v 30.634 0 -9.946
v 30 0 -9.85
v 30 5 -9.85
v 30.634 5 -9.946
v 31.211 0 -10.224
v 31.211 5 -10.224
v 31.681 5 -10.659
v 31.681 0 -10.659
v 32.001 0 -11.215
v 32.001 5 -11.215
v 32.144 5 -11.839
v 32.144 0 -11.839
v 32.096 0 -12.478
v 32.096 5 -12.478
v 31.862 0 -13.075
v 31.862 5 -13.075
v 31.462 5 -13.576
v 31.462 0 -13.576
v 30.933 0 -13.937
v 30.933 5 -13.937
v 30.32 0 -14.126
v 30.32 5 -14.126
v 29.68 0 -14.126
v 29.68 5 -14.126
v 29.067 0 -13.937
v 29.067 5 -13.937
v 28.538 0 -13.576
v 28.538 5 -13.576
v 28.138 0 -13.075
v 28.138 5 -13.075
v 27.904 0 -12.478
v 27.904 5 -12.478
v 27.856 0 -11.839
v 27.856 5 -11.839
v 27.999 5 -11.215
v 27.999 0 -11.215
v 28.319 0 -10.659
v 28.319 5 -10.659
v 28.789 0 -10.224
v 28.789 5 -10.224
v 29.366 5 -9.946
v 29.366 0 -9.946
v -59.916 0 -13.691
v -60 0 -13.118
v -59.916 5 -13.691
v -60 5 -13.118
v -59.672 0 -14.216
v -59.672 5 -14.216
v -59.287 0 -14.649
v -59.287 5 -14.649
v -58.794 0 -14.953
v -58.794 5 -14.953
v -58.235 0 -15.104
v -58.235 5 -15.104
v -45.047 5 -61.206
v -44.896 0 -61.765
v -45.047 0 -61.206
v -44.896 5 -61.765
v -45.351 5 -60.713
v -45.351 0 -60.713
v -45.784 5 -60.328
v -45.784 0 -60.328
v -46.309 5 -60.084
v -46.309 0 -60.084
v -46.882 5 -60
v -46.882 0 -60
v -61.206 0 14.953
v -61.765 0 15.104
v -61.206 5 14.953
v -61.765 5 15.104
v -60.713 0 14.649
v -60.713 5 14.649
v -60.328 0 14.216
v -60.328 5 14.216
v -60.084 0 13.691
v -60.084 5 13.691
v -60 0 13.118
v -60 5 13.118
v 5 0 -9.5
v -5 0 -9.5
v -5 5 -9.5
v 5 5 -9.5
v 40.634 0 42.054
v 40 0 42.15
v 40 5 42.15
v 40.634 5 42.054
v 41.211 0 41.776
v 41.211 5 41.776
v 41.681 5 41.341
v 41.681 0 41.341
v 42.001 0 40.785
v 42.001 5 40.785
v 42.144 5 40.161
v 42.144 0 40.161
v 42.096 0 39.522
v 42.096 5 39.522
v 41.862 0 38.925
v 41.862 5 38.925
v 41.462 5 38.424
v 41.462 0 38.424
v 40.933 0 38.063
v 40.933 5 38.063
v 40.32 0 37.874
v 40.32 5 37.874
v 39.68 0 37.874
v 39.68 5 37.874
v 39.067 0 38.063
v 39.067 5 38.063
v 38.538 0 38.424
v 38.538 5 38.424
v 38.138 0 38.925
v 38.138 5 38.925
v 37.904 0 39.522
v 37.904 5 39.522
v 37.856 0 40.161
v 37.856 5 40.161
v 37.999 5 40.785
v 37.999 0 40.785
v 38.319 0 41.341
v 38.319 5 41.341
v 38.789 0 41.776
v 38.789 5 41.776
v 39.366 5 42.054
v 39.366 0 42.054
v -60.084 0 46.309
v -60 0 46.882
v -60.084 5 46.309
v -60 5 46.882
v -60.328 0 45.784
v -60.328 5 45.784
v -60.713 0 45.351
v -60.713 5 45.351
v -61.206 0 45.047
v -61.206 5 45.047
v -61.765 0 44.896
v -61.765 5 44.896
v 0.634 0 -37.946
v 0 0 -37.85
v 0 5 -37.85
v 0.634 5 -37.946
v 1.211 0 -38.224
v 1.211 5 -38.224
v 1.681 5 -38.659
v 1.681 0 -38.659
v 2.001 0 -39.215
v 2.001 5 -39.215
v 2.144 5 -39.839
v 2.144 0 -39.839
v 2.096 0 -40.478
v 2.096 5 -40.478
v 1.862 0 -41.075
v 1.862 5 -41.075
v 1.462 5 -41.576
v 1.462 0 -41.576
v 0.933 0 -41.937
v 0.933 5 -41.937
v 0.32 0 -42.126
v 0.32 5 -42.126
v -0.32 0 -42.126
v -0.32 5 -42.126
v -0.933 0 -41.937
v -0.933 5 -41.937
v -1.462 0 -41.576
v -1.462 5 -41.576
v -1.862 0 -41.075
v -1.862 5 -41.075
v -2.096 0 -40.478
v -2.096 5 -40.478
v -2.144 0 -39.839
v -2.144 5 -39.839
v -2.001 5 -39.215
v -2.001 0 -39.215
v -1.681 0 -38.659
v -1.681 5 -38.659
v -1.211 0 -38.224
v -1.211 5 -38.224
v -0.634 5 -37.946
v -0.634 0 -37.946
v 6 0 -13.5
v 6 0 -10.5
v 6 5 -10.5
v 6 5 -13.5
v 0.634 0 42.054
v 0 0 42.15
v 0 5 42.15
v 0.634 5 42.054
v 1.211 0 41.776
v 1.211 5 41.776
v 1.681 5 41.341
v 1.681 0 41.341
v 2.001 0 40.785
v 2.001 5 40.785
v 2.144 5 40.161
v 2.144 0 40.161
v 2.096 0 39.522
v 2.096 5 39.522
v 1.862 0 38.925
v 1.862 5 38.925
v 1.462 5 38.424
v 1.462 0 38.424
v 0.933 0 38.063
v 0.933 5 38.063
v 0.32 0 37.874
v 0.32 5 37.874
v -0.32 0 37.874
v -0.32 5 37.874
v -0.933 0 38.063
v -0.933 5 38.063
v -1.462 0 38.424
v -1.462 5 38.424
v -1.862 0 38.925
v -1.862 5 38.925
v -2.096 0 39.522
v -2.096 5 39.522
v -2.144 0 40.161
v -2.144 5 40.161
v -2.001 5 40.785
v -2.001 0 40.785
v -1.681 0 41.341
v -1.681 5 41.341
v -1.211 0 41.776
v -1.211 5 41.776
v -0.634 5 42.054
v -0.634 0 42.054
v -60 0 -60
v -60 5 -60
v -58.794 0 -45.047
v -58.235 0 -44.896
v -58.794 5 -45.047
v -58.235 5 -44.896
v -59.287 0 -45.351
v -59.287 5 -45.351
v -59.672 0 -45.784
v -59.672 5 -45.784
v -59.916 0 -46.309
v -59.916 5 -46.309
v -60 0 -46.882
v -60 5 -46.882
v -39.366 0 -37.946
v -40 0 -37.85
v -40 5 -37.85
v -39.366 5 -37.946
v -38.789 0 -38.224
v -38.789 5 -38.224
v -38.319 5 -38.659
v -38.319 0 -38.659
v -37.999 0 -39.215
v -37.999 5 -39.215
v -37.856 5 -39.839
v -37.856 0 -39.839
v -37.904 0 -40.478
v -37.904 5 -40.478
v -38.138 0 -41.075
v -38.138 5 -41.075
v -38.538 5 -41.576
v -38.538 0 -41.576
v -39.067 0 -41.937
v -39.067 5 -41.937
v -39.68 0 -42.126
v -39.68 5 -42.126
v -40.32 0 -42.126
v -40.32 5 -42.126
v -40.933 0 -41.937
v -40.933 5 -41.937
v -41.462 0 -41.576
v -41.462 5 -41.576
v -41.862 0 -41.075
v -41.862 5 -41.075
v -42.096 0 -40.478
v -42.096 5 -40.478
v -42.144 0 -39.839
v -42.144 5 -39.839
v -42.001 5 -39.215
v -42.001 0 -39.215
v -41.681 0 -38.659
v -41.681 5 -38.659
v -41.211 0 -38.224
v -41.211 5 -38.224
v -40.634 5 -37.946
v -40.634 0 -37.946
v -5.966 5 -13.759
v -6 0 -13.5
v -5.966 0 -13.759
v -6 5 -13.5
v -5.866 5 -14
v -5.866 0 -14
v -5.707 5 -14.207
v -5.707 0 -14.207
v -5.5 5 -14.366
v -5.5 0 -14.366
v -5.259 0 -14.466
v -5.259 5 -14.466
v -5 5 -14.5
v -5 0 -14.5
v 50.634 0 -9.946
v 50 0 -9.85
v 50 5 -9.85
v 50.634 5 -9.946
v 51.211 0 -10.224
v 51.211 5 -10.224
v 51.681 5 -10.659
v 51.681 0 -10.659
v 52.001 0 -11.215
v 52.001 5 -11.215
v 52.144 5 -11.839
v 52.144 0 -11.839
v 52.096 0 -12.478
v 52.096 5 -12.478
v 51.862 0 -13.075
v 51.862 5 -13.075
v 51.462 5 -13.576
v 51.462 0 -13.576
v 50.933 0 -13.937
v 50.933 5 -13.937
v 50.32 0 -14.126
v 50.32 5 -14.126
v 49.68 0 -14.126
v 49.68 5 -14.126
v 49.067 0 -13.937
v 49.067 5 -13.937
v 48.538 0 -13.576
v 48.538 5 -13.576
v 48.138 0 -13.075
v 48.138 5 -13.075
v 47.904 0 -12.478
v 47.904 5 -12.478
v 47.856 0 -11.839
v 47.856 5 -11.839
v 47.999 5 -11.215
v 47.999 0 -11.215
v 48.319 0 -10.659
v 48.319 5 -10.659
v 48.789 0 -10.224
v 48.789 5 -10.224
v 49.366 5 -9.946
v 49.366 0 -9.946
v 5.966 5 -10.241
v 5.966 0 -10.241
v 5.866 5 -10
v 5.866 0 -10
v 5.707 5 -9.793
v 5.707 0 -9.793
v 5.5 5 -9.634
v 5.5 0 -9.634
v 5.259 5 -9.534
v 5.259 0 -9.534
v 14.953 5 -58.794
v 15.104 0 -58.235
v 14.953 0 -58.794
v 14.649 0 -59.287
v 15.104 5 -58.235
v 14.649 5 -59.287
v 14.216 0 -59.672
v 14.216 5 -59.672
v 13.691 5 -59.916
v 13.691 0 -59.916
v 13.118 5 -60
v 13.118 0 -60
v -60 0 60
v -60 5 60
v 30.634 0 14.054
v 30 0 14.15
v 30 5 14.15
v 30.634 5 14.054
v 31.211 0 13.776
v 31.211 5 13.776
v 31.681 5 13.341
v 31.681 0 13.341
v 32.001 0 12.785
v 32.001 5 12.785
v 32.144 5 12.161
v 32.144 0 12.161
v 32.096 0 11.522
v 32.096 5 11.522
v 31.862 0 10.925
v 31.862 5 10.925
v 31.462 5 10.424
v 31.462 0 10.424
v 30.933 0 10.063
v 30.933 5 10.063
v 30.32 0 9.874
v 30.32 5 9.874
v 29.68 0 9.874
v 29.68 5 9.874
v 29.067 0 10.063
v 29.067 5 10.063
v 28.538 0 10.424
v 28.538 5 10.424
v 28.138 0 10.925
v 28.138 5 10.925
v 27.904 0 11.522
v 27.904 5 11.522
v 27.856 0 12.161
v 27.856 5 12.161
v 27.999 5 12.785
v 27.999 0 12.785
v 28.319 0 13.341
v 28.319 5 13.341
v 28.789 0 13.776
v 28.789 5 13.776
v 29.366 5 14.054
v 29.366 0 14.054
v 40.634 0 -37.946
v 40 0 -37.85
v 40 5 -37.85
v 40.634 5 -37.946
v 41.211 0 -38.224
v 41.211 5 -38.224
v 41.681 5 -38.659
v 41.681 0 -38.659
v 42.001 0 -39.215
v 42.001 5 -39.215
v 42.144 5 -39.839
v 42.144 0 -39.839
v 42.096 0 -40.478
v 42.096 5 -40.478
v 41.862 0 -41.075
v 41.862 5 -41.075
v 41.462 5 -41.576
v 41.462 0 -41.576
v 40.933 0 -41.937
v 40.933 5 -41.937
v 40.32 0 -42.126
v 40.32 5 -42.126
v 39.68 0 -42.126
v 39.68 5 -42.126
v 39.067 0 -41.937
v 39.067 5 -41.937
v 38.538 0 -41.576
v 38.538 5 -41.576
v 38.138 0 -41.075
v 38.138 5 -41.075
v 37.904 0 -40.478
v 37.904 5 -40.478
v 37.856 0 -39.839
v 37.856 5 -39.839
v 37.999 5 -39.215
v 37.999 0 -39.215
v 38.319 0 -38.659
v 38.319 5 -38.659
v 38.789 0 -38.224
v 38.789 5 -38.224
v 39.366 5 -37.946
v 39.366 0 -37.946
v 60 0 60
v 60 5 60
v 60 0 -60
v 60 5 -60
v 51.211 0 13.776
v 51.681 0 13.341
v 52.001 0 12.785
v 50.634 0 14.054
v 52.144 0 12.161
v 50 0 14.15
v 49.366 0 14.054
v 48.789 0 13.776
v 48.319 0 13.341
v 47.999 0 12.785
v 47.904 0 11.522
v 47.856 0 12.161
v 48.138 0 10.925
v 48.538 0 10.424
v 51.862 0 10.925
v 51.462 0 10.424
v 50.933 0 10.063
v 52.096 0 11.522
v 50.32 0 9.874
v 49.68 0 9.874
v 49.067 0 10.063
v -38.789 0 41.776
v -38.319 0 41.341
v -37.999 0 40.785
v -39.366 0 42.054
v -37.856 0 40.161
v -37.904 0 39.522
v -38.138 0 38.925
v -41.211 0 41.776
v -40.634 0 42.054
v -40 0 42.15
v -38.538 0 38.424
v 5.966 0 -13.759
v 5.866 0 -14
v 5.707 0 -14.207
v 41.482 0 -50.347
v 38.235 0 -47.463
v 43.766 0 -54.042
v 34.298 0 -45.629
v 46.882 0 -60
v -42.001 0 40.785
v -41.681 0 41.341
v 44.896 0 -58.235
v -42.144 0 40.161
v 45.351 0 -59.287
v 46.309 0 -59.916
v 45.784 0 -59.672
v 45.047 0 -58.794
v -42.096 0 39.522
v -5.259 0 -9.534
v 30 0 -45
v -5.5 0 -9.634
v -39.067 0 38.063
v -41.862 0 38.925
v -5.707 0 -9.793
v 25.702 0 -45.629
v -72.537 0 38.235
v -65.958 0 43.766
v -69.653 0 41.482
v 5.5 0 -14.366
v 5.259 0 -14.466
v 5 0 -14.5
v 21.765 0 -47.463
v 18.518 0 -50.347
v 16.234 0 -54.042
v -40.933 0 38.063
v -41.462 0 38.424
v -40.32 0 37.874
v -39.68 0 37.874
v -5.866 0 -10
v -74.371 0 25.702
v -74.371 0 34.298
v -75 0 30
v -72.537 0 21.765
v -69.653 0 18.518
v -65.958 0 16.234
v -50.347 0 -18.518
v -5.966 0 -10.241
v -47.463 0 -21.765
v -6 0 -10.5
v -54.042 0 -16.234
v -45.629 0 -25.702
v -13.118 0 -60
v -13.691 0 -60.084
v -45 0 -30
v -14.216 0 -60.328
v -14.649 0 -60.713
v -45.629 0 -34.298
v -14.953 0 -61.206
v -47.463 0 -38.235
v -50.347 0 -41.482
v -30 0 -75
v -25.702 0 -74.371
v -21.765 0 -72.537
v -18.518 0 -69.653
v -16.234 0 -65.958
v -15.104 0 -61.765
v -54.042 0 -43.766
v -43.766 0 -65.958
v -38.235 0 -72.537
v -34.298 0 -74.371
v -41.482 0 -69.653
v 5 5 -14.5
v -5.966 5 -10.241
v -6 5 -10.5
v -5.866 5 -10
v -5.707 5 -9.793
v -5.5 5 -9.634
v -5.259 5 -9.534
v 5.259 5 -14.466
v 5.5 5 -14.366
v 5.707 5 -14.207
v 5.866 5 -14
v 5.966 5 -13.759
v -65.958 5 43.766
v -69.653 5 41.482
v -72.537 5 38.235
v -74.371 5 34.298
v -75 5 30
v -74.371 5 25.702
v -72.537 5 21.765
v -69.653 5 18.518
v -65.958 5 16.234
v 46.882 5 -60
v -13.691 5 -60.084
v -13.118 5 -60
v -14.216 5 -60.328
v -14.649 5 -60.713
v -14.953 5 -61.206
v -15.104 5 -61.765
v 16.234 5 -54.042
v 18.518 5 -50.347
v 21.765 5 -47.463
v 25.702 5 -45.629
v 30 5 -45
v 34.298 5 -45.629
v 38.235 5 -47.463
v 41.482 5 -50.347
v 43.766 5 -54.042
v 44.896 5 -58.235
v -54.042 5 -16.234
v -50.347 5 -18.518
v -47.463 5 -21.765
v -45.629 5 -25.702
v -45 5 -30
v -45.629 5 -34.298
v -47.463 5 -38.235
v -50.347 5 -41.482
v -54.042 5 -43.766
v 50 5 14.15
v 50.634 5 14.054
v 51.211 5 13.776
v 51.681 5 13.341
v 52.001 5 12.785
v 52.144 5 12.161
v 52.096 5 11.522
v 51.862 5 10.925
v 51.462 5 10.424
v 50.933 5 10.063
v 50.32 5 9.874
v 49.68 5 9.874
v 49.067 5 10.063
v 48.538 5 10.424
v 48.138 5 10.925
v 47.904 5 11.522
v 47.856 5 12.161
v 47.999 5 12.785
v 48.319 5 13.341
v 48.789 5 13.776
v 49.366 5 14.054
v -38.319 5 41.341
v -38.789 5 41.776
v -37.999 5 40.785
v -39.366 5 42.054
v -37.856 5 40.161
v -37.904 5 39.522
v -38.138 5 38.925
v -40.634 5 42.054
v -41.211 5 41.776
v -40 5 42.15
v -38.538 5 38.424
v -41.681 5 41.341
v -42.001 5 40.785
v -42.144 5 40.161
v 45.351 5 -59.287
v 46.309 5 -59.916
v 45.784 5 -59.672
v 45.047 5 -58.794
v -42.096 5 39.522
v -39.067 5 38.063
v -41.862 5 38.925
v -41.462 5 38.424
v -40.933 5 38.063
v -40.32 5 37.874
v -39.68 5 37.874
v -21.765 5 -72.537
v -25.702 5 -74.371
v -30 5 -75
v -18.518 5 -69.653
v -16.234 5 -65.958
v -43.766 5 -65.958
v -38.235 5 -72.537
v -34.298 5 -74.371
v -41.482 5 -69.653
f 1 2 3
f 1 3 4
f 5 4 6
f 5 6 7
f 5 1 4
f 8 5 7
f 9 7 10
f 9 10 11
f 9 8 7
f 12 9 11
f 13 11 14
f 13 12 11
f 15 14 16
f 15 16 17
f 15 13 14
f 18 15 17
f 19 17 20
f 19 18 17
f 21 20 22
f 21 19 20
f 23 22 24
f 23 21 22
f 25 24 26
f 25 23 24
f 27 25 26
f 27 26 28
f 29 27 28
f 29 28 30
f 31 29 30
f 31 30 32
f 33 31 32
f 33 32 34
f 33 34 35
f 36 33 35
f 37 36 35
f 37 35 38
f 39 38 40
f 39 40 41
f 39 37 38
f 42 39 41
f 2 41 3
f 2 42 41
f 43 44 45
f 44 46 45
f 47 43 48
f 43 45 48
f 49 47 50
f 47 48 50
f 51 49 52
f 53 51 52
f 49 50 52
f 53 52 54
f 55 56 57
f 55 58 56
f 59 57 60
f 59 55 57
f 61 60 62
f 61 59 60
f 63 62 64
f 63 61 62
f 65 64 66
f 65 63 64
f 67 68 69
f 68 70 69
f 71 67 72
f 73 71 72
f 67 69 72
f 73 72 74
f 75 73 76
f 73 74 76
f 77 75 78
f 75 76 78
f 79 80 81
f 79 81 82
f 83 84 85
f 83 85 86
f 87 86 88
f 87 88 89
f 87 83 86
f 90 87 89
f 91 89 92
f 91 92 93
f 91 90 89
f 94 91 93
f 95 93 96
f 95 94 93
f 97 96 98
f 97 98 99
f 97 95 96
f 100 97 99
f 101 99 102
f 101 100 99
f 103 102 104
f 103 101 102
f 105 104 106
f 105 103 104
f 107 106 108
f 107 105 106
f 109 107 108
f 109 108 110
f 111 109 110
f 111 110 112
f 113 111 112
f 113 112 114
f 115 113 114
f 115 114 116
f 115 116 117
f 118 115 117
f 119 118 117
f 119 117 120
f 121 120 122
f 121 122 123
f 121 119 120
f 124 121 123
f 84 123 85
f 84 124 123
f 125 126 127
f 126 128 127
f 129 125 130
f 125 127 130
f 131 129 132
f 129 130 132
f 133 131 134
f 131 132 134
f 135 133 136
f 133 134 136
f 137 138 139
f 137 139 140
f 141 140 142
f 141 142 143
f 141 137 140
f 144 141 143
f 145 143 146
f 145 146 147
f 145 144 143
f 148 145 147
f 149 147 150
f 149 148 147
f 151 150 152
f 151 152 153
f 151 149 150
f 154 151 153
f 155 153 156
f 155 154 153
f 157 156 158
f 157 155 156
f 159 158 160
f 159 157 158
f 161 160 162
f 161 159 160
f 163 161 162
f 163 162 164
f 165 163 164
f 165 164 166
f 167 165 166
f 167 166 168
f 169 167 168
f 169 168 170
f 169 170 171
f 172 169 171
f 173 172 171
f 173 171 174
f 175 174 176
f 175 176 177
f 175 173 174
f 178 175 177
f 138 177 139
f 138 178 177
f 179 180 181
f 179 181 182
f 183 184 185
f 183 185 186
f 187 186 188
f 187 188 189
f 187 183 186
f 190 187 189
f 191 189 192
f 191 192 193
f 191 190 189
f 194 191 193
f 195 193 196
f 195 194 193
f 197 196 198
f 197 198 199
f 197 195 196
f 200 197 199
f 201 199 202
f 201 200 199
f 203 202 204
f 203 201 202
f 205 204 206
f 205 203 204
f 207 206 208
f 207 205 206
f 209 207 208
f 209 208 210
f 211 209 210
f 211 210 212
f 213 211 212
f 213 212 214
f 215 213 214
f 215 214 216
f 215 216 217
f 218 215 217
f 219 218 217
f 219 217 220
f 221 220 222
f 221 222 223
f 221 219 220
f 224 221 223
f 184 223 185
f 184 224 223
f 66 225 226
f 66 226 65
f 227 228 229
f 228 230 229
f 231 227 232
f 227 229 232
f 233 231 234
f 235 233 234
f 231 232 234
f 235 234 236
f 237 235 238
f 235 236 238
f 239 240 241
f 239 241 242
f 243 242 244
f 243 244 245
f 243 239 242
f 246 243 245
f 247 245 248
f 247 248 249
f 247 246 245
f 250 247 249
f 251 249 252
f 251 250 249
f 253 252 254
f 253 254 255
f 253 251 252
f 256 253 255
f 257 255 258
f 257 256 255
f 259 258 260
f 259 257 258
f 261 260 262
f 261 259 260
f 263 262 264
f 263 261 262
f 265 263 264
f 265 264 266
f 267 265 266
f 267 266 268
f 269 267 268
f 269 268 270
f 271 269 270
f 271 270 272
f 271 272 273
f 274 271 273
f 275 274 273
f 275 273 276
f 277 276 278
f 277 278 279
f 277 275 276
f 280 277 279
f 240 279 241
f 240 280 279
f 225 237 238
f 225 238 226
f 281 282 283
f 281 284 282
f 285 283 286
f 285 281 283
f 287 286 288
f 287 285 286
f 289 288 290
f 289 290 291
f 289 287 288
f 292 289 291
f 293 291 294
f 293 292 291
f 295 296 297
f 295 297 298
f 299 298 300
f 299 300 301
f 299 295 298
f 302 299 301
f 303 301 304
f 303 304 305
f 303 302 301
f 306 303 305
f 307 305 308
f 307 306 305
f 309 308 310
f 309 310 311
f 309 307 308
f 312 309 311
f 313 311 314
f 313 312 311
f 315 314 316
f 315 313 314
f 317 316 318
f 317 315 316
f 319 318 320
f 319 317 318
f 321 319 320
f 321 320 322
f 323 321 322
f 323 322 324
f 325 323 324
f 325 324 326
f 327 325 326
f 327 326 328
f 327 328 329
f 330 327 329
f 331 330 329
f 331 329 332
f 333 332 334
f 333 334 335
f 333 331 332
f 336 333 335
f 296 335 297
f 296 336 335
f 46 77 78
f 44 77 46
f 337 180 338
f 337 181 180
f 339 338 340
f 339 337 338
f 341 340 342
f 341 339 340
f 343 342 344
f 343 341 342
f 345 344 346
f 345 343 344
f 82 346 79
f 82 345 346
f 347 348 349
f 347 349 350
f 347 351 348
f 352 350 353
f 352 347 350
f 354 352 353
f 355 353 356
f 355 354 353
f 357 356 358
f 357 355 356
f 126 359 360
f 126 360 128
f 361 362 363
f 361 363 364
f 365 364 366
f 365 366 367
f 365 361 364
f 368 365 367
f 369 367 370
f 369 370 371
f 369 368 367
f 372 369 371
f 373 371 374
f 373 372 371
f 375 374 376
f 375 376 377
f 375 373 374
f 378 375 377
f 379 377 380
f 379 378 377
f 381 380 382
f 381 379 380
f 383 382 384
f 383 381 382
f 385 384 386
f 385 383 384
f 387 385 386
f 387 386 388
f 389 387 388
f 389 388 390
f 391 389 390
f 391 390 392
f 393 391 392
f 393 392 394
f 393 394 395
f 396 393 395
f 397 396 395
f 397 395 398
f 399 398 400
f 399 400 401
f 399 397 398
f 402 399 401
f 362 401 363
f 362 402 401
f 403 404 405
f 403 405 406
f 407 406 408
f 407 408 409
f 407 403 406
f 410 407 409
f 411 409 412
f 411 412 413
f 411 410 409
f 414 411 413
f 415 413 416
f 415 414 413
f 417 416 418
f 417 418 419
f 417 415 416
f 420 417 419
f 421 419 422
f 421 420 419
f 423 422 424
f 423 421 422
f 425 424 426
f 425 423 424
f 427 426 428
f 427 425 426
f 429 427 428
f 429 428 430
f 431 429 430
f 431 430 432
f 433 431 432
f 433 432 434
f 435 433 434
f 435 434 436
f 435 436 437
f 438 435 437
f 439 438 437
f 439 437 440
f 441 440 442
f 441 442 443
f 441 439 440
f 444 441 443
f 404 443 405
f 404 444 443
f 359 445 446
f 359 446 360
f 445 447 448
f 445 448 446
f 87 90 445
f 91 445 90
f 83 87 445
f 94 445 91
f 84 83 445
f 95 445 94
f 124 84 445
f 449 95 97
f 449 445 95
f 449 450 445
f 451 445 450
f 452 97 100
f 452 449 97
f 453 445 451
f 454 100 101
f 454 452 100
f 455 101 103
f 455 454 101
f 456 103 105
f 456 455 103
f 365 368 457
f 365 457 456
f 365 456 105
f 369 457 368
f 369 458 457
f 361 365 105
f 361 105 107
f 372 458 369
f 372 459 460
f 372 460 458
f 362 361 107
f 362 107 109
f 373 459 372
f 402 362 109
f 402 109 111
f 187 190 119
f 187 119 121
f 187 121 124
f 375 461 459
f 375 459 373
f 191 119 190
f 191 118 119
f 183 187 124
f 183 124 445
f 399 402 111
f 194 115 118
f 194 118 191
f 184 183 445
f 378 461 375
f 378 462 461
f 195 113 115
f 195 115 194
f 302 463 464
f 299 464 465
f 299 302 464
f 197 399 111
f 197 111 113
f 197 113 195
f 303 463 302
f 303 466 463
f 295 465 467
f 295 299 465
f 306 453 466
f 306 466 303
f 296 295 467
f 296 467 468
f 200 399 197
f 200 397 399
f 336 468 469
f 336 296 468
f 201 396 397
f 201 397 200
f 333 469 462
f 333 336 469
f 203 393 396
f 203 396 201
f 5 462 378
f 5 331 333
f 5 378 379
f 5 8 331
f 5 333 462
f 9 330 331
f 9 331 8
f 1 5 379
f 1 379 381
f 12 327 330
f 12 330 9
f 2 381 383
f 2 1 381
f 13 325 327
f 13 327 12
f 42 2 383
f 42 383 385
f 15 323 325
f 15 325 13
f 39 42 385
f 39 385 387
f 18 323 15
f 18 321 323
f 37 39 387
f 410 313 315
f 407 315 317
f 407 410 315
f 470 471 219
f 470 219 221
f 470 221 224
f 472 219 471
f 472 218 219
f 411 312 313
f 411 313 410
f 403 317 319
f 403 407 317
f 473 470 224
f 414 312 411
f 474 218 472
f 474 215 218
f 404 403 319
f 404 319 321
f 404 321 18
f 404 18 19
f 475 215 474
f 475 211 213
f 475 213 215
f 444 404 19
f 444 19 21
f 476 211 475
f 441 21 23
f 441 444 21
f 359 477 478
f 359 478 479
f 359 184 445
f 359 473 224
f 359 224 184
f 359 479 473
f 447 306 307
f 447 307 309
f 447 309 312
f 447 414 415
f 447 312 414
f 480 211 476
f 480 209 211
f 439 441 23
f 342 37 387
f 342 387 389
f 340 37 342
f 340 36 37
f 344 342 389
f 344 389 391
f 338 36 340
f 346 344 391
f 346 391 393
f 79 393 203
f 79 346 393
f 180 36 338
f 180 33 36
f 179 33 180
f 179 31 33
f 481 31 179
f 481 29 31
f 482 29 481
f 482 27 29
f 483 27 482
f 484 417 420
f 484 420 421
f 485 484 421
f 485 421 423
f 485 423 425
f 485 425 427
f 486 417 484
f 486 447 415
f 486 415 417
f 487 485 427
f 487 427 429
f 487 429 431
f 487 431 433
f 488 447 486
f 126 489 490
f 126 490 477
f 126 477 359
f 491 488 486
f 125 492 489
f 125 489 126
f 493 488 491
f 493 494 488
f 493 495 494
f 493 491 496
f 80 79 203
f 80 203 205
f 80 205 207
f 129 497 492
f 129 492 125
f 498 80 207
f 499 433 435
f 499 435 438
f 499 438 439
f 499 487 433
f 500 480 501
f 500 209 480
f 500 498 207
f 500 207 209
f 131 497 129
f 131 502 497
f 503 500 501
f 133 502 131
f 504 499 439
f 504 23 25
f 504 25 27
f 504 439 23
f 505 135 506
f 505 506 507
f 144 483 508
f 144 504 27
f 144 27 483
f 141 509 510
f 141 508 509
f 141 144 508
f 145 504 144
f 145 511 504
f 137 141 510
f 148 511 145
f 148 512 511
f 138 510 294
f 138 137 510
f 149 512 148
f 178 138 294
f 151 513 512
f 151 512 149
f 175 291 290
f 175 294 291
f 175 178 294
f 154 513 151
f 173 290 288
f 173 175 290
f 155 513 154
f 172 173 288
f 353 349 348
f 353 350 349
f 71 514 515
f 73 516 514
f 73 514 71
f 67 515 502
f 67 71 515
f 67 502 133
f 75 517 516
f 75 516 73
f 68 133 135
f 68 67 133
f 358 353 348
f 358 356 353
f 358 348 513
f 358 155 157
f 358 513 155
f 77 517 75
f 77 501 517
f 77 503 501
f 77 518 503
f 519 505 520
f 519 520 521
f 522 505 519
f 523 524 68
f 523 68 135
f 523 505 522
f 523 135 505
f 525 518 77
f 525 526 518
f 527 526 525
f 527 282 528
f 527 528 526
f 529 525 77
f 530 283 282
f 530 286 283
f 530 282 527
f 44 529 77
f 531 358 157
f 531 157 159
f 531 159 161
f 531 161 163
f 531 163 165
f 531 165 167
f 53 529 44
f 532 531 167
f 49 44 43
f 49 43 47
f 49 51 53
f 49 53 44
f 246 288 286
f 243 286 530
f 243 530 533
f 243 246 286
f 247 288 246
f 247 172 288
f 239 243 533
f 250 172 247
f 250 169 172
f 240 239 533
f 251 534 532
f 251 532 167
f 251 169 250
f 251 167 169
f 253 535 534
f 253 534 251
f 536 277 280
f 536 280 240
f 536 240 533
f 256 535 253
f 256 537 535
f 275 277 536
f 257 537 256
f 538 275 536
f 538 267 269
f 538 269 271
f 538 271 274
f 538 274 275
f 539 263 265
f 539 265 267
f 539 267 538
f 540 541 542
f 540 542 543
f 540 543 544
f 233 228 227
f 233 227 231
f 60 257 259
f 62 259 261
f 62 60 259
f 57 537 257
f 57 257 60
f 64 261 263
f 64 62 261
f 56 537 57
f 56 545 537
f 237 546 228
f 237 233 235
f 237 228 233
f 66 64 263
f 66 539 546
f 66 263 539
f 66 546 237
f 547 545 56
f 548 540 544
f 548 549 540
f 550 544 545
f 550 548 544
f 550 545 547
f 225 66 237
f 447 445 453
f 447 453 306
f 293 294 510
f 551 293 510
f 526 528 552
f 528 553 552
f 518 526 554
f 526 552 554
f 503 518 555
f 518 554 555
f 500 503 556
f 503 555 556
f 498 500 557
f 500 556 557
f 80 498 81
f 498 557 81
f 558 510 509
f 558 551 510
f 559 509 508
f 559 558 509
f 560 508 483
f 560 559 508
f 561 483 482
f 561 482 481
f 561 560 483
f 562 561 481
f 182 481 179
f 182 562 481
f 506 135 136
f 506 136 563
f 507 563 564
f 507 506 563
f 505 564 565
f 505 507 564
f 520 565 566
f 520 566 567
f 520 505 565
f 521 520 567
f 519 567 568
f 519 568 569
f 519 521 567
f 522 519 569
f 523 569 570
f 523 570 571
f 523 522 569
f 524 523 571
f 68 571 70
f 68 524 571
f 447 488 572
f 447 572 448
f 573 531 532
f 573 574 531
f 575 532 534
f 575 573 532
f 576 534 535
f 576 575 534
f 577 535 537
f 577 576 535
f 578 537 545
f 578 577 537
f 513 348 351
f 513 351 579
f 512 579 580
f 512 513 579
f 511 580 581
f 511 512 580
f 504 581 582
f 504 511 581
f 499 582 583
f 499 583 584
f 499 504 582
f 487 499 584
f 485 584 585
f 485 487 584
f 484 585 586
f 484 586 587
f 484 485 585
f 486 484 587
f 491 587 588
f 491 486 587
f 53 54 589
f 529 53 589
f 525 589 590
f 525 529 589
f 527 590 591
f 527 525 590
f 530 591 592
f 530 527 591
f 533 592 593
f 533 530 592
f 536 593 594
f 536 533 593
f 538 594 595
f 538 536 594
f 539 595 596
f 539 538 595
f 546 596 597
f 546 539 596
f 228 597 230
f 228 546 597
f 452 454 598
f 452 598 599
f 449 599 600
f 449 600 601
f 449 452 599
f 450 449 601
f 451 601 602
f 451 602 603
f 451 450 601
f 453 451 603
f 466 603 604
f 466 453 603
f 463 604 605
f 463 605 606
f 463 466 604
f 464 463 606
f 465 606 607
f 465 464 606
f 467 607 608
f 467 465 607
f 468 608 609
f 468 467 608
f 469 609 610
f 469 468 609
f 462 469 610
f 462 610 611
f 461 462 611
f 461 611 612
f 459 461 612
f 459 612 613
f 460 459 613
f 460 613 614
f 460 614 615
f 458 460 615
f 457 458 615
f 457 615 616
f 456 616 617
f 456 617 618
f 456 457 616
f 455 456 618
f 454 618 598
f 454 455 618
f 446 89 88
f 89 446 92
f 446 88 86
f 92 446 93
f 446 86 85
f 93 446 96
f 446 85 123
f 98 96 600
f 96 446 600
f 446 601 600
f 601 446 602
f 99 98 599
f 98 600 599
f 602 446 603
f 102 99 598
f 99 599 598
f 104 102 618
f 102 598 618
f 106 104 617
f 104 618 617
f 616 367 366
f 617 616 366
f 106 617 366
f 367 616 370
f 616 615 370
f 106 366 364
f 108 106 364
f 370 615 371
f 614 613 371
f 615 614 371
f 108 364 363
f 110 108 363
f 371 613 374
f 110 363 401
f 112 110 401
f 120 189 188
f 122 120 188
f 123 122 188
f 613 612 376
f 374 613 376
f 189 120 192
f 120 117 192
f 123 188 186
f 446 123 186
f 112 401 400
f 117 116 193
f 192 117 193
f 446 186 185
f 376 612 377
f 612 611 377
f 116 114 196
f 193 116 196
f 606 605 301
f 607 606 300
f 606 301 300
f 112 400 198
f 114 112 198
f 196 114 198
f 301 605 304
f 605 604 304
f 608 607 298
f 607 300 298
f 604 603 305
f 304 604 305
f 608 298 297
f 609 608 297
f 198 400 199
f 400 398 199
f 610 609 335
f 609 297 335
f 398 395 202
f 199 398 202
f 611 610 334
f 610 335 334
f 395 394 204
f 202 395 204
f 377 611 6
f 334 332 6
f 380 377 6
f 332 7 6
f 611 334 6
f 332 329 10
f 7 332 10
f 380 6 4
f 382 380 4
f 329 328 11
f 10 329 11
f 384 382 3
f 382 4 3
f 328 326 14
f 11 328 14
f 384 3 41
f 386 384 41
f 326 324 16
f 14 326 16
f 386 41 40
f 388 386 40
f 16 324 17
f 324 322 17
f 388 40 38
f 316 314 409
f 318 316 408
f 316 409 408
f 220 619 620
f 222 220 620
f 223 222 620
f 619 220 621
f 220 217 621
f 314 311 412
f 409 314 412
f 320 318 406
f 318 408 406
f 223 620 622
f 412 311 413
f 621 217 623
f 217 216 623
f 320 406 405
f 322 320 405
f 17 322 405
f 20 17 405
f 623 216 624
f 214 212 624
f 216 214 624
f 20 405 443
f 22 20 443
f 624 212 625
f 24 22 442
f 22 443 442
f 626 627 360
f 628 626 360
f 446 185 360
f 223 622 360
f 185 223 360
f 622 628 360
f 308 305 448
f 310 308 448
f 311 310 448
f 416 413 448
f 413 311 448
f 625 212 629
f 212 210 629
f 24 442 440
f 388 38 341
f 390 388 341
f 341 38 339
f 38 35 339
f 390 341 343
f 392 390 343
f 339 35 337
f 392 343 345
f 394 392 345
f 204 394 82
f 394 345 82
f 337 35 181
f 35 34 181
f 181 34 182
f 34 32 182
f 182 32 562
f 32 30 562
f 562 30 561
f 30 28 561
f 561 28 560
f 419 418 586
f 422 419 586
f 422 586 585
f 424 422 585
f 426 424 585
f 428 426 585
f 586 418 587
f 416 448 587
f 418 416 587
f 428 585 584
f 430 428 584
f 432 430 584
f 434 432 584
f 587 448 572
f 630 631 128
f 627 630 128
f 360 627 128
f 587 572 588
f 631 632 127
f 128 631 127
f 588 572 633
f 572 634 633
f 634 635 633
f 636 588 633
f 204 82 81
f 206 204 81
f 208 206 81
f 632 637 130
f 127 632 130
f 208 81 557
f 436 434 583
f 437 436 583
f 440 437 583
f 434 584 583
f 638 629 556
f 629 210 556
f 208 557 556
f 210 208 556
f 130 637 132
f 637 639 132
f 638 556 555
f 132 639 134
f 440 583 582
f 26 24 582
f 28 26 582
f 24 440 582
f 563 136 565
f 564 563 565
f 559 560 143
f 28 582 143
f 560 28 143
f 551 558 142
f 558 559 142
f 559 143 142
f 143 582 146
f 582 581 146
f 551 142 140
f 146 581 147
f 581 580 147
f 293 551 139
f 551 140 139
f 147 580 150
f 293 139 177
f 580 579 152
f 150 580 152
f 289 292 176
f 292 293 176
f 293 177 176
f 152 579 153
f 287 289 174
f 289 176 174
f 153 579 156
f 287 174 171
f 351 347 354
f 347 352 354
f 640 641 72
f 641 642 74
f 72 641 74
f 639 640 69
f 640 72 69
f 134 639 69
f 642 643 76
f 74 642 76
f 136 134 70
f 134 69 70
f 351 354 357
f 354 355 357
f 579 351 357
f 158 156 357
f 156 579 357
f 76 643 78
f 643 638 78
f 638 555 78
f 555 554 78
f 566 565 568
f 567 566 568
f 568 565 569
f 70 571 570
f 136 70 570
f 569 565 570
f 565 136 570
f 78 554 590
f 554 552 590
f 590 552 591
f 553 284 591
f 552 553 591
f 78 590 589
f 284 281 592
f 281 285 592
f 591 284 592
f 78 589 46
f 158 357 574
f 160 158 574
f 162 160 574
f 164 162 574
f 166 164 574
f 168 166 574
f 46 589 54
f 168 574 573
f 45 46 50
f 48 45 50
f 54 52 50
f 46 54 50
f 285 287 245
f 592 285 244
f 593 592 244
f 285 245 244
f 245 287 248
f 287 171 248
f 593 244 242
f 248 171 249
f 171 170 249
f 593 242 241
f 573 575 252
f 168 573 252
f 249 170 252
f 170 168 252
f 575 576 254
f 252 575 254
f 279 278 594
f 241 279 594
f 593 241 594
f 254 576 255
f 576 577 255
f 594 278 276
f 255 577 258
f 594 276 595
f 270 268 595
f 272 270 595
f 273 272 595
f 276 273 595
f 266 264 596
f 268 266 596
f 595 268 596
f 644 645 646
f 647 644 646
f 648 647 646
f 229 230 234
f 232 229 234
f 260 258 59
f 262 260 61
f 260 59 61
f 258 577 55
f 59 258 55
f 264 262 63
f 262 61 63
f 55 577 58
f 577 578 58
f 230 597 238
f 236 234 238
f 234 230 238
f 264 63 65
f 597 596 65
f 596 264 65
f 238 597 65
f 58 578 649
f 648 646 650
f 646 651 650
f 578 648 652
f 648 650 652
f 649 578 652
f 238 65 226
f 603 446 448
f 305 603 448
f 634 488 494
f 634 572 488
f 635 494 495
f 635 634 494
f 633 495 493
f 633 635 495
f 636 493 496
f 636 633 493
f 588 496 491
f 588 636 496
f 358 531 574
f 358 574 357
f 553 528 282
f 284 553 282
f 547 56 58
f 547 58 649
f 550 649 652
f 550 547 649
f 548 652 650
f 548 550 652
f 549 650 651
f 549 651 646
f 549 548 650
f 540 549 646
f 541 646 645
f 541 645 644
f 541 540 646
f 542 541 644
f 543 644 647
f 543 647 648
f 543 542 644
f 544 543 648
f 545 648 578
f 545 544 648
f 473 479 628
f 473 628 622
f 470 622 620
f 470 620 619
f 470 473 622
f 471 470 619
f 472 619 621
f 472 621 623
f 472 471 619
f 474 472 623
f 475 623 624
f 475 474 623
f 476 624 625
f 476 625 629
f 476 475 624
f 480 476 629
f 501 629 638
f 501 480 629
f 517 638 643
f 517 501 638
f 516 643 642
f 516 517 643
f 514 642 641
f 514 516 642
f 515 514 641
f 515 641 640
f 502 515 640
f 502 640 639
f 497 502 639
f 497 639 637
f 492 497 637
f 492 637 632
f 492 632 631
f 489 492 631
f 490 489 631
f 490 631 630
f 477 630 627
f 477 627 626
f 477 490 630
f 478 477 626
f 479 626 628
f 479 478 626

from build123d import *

# Parameters (mm, degrees)
SKETCH1_R           = 2.15
SKETCH1_W           = 12
SKETCH1_H           = 5
BOSS_EXTRUDE1_DEPTH = 5
FILLET1_R           = 2
FILLET2_R           = 1


with BuildPart() as part:
    # Sketch1 → Boss-Extrude1 (new body)
    with BuildSketch(Plane(origin=(0, 0, 0), x_dir=(1, 0, 0), z_dir=(0, 1, 0))):
        with BuildLine():
            Line((60, -60), (-60, -60))
            Line((-60, -60), (-60, -45))
            ThreePointArc((-60, -45), (-75, -30), (-60, -15))
            Line((-60, -15), (-60, 15))
            ThreePointArc((-60, 15), (-45, 30), (-60, 45))
            Line((-60, 45), (-60, 60))
            Line((-60, 60), (-45, 60))
            ThreePointArc((-45, 60), (-30, 75), (-15, 60))
            Line((-15, 60), (15, 60))
            ThreePointArc((15, 60), (30, 45), (45, 60))
            Line((45, 60), (60, 60))
            Line((60, 60), (60, -60))
        make_face()
        with Locations((-40, 40)):
            Circle(SKETCH1_R, mode=Mode.SUBTRACT)
        with Locations((40, 40)):
            Circle(SKETCH1_R, mode=Mode.SUBTRACT)
        with Locations((40, -40)):
            Circle(SKETCH1_R, mode=Mode.SUBTRACT)
        with Locations((-40, -40)):
            Circle(SKETCH1_R, mode=Mode.SUBTRACT)
        with Locations((30, 12)):
            Circle(SKETCH1_R, mode=Mode.SUBTRACT)
        with Locations((50, 12)):
            Circle(SKETCH1_R, mode=Mode.SUBTRACT)
        with Locations((30, -12)):
            Circle(SKETCH1_R, mode=Mode.SUBTRACT)
        with Locations((50, -12)):
            Circle(SKETCH1_R, mode=Mode.SUBTRACT)
        with Locations((0, 40)):
            Circle(SKETCH1_R, mode=Mode.SUBTRACT)
        with Locations((0, -40)):
            Circle(SKETCH1_R, mode=Mode.SUBTRACT)
        with Locations((0, 12)):
            Rectangle(SKETCH1_W, SKETCH1_H, mode=Mode.SUBTRACT)
    extrude(amount=BOSS_EXTRUDE1_DEPTH)

    # Fillet1
    fillet1_edges = [part.edges().sort_by_distance(p)[0] for p in [
        (-60, 2.5, 45),
        (-60, 2.5, 15),
        (45, 2.5, -60),
        (15, 2.5, -60),
        (-15, 2.5, -60),
        (-45, 2.5, -60),
        (-60, 2.5, -45),
        (-60, 2.5, -15),
    ]]
    fillet(fillet1_edges, radius=FILLET1_R)

    # Fillet2
    fillet2_edges = [part.edges().sort_by_distance(p)[0] for p in [
        (6, 2.5, -9.5),
        (6, 2.5, -14.5),
        (-6, 2.5, -9.5),
        (-6, 2.5, -14.5),
    ]]
    fillet(fillet2_edges, radius=FILLET2_R)


solid = part.part
